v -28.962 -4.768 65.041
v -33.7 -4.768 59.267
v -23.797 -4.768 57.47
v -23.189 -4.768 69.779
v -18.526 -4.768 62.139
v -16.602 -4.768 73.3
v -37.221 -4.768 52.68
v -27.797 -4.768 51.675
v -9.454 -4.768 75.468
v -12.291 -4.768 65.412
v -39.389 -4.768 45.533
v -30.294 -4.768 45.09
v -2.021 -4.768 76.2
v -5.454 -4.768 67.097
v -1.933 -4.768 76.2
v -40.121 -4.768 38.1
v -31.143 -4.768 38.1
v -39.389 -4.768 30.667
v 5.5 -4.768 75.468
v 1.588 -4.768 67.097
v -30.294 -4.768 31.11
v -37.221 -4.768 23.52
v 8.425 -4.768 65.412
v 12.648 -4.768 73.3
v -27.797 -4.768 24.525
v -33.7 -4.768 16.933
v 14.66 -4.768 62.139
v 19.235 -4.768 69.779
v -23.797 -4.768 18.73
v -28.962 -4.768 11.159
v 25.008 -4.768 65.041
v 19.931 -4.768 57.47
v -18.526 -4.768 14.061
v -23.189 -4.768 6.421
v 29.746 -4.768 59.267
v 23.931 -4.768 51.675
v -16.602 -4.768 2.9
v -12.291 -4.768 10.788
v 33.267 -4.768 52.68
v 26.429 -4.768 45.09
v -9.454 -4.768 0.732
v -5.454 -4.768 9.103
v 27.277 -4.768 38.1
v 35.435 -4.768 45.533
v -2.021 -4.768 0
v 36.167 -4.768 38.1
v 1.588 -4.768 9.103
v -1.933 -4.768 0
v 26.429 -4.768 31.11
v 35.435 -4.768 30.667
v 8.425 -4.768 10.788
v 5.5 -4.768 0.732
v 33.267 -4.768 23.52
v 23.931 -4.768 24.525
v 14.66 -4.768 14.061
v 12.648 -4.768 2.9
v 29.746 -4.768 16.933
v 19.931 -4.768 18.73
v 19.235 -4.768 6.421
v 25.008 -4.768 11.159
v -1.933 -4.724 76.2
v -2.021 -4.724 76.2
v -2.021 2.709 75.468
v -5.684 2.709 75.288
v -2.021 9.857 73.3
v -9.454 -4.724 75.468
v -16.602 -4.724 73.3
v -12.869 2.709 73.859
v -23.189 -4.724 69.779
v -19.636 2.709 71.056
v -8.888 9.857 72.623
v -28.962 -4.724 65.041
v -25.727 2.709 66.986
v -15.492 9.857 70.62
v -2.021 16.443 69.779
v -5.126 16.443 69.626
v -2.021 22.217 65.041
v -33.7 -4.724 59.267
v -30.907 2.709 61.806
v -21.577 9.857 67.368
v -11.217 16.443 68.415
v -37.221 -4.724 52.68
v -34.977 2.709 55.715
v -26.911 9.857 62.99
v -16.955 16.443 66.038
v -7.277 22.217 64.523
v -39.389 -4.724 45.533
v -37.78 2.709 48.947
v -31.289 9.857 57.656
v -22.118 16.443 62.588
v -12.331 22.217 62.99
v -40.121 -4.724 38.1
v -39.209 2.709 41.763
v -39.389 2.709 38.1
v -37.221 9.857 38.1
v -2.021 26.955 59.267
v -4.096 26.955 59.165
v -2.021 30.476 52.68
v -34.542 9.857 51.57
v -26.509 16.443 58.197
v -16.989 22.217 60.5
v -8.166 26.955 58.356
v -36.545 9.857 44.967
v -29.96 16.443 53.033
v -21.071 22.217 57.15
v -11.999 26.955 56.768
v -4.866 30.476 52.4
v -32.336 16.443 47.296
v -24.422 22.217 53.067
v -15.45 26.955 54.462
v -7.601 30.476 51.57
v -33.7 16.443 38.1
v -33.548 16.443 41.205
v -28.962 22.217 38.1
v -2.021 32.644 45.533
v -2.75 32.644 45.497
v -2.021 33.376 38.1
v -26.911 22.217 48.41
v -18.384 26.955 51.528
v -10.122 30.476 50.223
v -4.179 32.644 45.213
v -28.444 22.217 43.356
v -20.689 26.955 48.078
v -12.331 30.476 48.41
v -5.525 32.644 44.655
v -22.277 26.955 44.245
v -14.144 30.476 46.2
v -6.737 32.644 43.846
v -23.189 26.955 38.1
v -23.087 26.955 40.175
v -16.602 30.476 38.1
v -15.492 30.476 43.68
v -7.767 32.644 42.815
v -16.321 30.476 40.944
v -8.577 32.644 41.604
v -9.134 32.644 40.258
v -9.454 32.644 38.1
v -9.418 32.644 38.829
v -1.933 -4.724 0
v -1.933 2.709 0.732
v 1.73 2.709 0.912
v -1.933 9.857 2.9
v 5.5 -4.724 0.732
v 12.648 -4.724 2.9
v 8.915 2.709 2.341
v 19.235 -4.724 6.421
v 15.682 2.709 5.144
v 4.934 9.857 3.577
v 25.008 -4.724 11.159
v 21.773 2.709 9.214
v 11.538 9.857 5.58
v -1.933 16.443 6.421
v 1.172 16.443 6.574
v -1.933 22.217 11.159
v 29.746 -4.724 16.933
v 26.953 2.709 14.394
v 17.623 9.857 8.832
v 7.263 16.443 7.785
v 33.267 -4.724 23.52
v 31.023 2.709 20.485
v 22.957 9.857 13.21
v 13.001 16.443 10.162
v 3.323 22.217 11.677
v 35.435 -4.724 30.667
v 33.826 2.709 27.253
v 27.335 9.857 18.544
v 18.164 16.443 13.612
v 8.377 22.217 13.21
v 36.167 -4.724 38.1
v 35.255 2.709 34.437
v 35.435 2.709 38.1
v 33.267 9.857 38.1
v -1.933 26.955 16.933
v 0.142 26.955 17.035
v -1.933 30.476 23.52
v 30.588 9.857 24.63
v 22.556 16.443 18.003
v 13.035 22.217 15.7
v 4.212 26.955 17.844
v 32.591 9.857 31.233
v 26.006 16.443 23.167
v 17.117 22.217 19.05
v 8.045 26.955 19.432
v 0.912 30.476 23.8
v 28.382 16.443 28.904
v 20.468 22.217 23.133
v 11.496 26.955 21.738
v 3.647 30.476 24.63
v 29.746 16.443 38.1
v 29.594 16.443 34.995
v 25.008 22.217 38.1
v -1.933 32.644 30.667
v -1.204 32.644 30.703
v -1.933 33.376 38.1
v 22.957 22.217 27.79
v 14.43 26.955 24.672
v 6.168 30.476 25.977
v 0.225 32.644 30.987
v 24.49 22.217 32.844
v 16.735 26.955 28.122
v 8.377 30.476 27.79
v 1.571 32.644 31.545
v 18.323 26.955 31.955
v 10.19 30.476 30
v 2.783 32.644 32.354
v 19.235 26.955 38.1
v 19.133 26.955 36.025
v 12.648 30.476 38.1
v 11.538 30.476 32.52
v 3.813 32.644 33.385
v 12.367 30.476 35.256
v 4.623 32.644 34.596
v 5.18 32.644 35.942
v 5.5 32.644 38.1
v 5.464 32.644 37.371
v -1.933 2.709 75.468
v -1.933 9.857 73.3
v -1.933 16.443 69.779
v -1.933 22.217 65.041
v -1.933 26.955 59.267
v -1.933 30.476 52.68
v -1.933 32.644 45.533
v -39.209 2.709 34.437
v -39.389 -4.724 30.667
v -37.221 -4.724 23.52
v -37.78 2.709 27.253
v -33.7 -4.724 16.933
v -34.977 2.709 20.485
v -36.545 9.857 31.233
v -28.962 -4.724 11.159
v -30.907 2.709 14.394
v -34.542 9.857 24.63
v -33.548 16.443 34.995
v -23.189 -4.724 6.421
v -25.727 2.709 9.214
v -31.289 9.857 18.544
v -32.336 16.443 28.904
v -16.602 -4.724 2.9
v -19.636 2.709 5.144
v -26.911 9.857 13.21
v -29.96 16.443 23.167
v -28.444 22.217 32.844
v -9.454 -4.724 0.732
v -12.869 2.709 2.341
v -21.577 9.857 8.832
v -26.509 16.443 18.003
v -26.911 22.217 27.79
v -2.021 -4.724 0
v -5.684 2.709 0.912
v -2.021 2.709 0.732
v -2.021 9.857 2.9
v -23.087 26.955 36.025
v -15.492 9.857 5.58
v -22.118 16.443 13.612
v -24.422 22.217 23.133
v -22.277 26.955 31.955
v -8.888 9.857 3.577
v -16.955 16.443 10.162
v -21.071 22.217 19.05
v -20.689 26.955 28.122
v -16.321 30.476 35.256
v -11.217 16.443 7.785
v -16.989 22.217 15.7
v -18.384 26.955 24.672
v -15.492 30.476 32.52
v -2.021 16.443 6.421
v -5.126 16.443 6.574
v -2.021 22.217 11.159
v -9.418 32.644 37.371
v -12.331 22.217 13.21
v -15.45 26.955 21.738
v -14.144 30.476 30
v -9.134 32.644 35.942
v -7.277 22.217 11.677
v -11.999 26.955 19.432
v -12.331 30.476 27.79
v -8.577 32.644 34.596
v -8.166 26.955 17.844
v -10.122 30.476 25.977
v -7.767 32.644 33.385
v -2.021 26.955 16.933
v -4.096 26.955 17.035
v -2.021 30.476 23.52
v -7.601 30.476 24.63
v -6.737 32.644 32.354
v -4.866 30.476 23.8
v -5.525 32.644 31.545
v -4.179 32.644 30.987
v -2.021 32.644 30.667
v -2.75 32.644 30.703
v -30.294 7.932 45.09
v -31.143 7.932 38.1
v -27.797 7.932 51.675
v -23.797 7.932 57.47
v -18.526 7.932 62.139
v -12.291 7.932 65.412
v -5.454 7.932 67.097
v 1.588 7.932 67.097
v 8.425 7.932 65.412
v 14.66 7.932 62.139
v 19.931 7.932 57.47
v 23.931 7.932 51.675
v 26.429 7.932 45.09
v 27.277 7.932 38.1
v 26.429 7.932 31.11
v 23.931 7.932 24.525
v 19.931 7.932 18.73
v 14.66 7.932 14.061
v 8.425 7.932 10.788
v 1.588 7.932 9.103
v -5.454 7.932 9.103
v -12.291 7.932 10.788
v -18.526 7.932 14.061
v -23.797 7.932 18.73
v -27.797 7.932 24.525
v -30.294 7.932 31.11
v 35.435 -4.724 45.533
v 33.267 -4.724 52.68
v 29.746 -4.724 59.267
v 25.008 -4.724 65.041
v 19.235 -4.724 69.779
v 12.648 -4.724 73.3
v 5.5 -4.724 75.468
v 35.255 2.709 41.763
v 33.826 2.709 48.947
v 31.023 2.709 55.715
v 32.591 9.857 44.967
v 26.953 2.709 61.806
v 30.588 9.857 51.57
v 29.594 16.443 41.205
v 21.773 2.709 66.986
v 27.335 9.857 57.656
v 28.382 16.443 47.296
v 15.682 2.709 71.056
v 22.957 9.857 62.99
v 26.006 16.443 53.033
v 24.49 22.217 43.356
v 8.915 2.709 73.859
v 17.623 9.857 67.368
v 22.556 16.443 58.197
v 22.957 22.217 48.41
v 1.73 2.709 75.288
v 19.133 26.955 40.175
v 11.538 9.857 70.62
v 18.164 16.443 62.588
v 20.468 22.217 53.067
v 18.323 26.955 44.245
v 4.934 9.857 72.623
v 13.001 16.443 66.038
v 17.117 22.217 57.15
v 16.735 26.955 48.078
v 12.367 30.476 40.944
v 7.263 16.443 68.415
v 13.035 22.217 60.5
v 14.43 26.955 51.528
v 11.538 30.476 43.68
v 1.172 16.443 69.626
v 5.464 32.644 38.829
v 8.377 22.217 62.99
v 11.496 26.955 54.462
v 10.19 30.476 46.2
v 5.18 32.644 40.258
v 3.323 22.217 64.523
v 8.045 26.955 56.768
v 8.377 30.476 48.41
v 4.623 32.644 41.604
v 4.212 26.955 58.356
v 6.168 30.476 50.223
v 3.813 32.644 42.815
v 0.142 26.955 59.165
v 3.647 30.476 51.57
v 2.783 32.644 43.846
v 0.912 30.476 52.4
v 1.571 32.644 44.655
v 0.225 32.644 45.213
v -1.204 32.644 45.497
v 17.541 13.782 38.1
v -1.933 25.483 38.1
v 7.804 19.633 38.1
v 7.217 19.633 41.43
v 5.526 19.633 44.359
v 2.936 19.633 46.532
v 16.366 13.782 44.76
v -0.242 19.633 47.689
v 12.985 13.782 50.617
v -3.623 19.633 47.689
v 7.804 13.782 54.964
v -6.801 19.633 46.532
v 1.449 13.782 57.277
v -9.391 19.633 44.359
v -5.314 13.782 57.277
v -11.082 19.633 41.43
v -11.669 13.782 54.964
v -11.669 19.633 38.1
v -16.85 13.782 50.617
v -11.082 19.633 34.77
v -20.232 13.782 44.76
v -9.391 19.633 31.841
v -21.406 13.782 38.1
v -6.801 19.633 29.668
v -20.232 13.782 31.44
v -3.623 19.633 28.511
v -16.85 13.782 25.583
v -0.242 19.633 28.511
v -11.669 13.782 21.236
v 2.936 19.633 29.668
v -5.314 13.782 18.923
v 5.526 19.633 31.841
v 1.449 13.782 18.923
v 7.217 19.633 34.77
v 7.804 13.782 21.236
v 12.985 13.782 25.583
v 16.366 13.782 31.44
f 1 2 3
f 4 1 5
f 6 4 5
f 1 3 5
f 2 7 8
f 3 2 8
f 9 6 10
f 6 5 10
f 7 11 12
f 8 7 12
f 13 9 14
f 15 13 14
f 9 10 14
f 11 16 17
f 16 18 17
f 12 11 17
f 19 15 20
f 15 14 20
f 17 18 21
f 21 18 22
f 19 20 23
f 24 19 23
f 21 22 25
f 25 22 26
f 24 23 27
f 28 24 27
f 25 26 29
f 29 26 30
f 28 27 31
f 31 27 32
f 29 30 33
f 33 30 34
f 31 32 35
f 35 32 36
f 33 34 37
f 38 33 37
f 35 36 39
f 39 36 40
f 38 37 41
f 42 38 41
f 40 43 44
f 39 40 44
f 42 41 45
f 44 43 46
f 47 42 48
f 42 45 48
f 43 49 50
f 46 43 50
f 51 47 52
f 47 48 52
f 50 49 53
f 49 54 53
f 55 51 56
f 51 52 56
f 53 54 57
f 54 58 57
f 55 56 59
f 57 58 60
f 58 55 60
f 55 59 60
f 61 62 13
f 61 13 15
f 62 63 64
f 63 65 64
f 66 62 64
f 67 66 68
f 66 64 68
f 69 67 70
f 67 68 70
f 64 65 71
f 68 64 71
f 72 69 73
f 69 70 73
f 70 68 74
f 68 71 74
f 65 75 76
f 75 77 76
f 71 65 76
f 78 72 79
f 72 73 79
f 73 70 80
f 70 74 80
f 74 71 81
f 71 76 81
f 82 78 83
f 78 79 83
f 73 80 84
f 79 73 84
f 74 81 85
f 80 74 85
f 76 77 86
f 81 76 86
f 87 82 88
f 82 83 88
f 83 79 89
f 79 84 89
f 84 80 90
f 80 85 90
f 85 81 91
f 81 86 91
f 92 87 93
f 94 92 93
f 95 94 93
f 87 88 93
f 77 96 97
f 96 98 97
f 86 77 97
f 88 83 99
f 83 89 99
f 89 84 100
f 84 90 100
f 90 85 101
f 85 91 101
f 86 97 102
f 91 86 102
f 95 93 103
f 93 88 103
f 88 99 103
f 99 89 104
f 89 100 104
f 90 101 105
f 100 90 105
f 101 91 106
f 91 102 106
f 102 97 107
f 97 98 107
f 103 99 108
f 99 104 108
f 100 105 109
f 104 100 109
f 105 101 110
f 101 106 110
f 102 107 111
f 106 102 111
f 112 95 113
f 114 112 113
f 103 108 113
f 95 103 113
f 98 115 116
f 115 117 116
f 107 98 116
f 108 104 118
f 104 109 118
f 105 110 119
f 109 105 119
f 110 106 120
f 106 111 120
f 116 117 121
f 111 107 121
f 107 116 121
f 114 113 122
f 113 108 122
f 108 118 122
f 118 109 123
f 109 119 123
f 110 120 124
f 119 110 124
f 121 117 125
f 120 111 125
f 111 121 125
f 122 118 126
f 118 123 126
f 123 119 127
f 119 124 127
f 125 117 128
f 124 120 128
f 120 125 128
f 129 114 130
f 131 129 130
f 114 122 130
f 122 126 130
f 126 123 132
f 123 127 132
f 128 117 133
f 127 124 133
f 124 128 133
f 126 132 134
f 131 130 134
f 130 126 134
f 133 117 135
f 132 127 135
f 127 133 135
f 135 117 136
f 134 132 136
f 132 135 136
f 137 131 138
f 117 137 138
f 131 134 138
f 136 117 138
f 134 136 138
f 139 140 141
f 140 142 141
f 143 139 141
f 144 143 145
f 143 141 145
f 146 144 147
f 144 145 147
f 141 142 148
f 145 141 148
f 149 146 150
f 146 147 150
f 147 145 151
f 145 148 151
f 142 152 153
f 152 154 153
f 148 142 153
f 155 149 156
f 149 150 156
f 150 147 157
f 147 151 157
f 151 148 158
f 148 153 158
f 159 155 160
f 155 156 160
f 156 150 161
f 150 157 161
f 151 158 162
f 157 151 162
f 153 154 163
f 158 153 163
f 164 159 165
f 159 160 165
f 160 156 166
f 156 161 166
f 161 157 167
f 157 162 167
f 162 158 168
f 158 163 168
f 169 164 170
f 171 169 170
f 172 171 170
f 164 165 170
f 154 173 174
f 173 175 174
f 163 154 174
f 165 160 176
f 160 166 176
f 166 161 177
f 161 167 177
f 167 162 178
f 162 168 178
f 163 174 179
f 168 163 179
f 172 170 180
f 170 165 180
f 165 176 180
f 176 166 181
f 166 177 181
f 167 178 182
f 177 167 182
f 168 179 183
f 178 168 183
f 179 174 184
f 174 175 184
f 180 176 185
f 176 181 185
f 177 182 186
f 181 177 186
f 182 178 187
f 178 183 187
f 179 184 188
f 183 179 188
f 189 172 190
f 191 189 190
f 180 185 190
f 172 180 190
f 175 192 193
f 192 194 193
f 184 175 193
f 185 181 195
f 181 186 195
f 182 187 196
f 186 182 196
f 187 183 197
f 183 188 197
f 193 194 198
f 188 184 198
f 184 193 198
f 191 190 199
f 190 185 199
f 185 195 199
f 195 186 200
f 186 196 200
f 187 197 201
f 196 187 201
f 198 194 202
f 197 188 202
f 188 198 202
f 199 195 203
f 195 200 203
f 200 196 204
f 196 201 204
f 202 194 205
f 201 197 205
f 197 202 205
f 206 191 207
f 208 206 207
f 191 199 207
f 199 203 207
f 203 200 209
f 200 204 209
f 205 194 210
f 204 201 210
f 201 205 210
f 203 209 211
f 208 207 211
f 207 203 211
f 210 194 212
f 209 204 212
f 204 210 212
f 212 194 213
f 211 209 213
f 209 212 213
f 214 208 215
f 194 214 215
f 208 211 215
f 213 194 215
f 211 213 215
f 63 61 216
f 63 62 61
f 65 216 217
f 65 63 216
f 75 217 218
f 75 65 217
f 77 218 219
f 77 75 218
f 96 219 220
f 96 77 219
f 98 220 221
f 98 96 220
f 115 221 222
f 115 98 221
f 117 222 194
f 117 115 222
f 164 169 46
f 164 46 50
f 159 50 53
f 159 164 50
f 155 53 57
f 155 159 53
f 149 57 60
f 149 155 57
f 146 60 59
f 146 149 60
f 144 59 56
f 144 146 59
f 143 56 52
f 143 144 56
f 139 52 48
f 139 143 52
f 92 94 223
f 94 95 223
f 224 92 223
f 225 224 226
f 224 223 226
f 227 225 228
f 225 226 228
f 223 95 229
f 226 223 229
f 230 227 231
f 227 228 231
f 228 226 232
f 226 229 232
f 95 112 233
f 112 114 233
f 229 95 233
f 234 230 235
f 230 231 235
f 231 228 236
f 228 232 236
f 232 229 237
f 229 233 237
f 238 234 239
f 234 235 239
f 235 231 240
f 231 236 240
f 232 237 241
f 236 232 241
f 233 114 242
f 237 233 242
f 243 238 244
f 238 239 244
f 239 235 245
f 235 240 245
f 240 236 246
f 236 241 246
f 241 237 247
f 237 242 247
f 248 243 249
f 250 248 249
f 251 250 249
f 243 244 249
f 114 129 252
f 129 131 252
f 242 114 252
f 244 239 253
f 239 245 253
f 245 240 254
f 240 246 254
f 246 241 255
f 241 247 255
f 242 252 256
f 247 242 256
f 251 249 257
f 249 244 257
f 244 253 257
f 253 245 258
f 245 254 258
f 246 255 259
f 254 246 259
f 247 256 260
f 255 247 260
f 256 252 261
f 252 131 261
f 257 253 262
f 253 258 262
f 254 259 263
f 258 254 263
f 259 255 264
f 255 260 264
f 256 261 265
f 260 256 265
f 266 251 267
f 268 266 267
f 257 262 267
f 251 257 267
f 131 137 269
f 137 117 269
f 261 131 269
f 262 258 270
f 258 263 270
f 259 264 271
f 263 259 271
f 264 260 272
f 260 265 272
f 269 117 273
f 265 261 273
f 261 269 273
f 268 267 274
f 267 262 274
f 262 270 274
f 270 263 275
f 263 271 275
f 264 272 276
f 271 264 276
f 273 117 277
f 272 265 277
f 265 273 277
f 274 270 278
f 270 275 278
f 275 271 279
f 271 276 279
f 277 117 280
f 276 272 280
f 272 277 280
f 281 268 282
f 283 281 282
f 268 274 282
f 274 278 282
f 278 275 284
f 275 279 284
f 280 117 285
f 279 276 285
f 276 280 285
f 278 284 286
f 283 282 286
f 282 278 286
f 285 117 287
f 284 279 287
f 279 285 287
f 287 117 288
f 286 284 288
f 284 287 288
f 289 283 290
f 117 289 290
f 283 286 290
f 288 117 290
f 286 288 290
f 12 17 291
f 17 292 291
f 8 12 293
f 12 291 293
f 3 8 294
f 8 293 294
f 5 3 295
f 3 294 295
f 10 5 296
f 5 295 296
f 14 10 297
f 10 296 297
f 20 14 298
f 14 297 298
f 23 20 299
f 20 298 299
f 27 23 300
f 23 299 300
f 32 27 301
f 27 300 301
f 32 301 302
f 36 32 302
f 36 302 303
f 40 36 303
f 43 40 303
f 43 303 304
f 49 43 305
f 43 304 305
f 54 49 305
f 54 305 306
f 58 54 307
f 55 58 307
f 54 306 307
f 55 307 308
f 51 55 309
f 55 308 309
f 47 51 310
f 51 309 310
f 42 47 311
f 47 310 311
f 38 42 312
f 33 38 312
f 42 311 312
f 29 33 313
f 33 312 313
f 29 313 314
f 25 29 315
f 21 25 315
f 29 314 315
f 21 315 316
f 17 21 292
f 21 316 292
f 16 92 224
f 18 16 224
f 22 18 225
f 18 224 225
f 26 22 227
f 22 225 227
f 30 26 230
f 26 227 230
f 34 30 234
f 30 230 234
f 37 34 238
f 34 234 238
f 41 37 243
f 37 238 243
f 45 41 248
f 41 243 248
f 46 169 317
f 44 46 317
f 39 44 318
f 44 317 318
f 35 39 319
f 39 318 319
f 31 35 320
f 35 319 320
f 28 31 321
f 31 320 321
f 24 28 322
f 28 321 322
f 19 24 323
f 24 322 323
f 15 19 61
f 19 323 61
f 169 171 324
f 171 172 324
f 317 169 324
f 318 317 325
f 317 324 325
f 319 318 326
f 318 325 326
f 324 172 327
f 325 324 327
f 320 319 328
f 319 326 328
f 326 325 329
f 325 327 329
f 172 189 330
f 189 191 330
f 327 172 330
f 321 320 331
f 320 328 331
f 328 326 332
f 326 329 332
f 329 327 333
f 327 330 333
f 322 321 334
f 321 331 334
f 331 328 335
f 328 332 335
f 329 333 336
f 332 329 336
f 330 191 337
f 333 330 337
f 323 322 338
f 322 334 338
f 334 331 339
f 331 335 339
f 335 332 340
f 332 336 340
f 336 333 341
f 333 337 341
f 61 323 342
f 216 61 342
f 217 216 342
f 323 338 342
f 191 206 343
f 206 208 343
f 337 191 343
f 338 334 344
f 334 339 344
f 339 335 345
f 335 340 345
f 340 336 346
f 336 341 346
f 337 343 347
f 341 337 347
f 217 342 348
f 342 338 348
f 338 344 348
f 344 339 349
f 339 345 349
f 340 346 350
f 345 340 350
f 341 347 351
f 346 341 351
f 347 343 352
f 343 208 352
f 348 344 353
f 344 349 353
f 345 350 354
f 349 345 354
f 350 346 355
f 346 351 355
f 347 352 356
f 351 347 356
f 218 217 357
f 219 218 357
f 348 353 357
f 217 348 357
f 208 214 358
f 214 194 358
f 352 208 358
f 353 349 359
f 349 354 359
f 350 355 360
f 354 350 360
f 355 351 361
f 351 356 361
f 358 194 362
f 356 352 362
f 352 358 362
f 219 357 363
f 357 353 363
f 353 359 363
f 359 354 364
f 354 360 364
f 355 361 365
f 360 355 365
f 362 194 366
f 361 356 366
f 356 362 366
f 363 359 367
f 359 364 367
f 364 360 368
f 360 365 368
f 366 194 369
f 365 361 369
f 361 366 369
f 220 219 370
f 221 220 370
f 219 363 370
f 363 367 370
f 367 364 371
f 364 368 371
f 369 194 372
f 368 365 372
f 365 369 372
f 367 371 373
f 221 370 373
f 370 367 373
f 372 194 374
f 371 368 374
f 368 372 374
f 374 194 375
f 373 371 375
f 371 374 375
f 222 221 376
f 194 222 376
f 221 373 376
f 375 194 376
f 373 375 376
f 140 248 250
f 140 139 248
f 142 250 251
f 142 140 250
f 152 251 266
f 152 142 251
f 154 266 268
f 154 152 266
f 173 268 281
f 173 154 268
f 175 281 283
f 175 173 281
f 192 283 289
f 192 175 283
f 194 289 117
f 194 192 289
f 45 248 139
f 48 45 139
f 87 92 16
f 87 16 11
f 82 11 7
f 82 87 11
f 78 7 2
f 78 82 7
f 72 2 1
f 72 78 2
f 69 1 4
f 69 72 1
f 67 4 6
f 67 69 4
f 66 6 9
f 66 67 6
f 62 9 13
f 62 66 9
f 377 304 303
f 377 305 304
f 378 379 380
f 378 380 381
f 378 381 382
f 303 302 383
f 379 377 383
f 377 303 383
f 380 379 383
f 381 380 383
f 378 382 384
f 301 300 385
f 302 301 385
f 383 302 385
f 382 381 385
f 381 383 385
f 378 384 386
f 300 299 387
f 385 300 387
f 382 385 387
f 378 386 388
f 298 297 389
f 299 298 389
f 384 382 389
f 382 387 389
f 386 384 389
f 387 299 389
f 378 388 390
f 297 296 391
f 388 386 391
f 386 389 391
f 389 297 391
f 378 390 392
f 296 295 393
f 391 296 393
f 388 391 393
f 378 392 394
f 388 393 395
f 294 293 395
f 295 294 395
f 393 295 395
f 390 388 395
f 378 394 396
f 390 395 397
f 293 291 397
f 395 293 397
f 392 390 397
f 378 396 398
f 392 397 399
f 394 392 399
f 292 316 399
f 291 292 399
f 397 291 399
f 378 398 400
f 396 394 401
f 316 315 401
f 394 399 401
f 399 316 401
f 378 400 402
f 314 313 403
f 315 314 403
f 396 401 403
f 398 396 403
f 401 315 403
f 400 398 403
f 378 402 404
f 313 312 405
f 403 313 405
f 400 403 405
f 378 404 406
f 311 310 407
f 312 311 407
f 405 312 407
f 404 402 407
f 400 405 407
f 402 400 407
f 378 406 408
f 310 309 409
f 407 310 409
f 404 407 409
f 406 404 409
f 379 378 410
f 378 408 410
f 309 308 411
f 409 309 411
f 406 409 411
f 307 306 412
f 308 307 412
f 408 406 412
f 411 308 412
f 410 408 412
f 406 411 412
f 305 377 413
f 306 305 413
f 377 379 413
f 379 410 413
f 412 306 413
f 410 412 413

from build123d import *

# Parameters (mm, degrees)
F0_W     = 76.2886069715
F0_H     = 38.1443030201
F1_DEPTH = 76.2
F2_R     = 38.09999
F4_R     = 38.09999
F5_D     = 58.42
F5_DEPTH = 12.7
F5_TIP   = 17.5511386818


# Not quite as in the source:
# - a fillet or chamfer is up to 0.001 mm smaller than in the source, because OpenCascade refuses the exact size


with BuildPart() as f1:
    # F0 (on Top) → F1 (new body)
    with BuildSketch(Plane.XY):
        with Locations((-1.9769910723, 14.3041138072)):
            Rectangle(F0_W, F0_H)
    extrude(amount=F1_DEPTH)

    # F2 (radius 38.1 in the source; OpenCascade refuses exactly that, so slightly less here)
    f2_edges = [f1.edges().sort_by_distance(p)[0] for p in [
        (-40.121295, 14.304114, 76.2),
        (-40.121295, 14.304114, 0),
        (36.167312, 14.304114, 0),
        (36.167312, 14.304114, 76.2),
    ]]
    fillet(f2_edges, radius=F2_R)

    # F4 (radius 38.1 in the source; OpenCascade refuses exactly that, so slightly less here)
    f4_edges = [f1.edges().sort_by_distance(p)[0] for p in [
        (-28.962066, 33.376265, 11.159229),
        (25.008084, 33.376265, 11.159229),
    ]]
    fillet(f4_edges, radius=F4_R)

    # F5
    with Locations(Plane.XZ.offset(4.7680377029)):
        with Locations((-1.9326875865, 38.1)):
            Hole(F5_D / 2, depth=F5_DEPTH)
            with Locations((0, 0, -(F5_DEPTH + F5_TIP / 2))):  # 118° drill point
                Cone(0, F5_D / 2, F5_TIP, mode=Mode.SUBTRACT)


solid = f1.part
